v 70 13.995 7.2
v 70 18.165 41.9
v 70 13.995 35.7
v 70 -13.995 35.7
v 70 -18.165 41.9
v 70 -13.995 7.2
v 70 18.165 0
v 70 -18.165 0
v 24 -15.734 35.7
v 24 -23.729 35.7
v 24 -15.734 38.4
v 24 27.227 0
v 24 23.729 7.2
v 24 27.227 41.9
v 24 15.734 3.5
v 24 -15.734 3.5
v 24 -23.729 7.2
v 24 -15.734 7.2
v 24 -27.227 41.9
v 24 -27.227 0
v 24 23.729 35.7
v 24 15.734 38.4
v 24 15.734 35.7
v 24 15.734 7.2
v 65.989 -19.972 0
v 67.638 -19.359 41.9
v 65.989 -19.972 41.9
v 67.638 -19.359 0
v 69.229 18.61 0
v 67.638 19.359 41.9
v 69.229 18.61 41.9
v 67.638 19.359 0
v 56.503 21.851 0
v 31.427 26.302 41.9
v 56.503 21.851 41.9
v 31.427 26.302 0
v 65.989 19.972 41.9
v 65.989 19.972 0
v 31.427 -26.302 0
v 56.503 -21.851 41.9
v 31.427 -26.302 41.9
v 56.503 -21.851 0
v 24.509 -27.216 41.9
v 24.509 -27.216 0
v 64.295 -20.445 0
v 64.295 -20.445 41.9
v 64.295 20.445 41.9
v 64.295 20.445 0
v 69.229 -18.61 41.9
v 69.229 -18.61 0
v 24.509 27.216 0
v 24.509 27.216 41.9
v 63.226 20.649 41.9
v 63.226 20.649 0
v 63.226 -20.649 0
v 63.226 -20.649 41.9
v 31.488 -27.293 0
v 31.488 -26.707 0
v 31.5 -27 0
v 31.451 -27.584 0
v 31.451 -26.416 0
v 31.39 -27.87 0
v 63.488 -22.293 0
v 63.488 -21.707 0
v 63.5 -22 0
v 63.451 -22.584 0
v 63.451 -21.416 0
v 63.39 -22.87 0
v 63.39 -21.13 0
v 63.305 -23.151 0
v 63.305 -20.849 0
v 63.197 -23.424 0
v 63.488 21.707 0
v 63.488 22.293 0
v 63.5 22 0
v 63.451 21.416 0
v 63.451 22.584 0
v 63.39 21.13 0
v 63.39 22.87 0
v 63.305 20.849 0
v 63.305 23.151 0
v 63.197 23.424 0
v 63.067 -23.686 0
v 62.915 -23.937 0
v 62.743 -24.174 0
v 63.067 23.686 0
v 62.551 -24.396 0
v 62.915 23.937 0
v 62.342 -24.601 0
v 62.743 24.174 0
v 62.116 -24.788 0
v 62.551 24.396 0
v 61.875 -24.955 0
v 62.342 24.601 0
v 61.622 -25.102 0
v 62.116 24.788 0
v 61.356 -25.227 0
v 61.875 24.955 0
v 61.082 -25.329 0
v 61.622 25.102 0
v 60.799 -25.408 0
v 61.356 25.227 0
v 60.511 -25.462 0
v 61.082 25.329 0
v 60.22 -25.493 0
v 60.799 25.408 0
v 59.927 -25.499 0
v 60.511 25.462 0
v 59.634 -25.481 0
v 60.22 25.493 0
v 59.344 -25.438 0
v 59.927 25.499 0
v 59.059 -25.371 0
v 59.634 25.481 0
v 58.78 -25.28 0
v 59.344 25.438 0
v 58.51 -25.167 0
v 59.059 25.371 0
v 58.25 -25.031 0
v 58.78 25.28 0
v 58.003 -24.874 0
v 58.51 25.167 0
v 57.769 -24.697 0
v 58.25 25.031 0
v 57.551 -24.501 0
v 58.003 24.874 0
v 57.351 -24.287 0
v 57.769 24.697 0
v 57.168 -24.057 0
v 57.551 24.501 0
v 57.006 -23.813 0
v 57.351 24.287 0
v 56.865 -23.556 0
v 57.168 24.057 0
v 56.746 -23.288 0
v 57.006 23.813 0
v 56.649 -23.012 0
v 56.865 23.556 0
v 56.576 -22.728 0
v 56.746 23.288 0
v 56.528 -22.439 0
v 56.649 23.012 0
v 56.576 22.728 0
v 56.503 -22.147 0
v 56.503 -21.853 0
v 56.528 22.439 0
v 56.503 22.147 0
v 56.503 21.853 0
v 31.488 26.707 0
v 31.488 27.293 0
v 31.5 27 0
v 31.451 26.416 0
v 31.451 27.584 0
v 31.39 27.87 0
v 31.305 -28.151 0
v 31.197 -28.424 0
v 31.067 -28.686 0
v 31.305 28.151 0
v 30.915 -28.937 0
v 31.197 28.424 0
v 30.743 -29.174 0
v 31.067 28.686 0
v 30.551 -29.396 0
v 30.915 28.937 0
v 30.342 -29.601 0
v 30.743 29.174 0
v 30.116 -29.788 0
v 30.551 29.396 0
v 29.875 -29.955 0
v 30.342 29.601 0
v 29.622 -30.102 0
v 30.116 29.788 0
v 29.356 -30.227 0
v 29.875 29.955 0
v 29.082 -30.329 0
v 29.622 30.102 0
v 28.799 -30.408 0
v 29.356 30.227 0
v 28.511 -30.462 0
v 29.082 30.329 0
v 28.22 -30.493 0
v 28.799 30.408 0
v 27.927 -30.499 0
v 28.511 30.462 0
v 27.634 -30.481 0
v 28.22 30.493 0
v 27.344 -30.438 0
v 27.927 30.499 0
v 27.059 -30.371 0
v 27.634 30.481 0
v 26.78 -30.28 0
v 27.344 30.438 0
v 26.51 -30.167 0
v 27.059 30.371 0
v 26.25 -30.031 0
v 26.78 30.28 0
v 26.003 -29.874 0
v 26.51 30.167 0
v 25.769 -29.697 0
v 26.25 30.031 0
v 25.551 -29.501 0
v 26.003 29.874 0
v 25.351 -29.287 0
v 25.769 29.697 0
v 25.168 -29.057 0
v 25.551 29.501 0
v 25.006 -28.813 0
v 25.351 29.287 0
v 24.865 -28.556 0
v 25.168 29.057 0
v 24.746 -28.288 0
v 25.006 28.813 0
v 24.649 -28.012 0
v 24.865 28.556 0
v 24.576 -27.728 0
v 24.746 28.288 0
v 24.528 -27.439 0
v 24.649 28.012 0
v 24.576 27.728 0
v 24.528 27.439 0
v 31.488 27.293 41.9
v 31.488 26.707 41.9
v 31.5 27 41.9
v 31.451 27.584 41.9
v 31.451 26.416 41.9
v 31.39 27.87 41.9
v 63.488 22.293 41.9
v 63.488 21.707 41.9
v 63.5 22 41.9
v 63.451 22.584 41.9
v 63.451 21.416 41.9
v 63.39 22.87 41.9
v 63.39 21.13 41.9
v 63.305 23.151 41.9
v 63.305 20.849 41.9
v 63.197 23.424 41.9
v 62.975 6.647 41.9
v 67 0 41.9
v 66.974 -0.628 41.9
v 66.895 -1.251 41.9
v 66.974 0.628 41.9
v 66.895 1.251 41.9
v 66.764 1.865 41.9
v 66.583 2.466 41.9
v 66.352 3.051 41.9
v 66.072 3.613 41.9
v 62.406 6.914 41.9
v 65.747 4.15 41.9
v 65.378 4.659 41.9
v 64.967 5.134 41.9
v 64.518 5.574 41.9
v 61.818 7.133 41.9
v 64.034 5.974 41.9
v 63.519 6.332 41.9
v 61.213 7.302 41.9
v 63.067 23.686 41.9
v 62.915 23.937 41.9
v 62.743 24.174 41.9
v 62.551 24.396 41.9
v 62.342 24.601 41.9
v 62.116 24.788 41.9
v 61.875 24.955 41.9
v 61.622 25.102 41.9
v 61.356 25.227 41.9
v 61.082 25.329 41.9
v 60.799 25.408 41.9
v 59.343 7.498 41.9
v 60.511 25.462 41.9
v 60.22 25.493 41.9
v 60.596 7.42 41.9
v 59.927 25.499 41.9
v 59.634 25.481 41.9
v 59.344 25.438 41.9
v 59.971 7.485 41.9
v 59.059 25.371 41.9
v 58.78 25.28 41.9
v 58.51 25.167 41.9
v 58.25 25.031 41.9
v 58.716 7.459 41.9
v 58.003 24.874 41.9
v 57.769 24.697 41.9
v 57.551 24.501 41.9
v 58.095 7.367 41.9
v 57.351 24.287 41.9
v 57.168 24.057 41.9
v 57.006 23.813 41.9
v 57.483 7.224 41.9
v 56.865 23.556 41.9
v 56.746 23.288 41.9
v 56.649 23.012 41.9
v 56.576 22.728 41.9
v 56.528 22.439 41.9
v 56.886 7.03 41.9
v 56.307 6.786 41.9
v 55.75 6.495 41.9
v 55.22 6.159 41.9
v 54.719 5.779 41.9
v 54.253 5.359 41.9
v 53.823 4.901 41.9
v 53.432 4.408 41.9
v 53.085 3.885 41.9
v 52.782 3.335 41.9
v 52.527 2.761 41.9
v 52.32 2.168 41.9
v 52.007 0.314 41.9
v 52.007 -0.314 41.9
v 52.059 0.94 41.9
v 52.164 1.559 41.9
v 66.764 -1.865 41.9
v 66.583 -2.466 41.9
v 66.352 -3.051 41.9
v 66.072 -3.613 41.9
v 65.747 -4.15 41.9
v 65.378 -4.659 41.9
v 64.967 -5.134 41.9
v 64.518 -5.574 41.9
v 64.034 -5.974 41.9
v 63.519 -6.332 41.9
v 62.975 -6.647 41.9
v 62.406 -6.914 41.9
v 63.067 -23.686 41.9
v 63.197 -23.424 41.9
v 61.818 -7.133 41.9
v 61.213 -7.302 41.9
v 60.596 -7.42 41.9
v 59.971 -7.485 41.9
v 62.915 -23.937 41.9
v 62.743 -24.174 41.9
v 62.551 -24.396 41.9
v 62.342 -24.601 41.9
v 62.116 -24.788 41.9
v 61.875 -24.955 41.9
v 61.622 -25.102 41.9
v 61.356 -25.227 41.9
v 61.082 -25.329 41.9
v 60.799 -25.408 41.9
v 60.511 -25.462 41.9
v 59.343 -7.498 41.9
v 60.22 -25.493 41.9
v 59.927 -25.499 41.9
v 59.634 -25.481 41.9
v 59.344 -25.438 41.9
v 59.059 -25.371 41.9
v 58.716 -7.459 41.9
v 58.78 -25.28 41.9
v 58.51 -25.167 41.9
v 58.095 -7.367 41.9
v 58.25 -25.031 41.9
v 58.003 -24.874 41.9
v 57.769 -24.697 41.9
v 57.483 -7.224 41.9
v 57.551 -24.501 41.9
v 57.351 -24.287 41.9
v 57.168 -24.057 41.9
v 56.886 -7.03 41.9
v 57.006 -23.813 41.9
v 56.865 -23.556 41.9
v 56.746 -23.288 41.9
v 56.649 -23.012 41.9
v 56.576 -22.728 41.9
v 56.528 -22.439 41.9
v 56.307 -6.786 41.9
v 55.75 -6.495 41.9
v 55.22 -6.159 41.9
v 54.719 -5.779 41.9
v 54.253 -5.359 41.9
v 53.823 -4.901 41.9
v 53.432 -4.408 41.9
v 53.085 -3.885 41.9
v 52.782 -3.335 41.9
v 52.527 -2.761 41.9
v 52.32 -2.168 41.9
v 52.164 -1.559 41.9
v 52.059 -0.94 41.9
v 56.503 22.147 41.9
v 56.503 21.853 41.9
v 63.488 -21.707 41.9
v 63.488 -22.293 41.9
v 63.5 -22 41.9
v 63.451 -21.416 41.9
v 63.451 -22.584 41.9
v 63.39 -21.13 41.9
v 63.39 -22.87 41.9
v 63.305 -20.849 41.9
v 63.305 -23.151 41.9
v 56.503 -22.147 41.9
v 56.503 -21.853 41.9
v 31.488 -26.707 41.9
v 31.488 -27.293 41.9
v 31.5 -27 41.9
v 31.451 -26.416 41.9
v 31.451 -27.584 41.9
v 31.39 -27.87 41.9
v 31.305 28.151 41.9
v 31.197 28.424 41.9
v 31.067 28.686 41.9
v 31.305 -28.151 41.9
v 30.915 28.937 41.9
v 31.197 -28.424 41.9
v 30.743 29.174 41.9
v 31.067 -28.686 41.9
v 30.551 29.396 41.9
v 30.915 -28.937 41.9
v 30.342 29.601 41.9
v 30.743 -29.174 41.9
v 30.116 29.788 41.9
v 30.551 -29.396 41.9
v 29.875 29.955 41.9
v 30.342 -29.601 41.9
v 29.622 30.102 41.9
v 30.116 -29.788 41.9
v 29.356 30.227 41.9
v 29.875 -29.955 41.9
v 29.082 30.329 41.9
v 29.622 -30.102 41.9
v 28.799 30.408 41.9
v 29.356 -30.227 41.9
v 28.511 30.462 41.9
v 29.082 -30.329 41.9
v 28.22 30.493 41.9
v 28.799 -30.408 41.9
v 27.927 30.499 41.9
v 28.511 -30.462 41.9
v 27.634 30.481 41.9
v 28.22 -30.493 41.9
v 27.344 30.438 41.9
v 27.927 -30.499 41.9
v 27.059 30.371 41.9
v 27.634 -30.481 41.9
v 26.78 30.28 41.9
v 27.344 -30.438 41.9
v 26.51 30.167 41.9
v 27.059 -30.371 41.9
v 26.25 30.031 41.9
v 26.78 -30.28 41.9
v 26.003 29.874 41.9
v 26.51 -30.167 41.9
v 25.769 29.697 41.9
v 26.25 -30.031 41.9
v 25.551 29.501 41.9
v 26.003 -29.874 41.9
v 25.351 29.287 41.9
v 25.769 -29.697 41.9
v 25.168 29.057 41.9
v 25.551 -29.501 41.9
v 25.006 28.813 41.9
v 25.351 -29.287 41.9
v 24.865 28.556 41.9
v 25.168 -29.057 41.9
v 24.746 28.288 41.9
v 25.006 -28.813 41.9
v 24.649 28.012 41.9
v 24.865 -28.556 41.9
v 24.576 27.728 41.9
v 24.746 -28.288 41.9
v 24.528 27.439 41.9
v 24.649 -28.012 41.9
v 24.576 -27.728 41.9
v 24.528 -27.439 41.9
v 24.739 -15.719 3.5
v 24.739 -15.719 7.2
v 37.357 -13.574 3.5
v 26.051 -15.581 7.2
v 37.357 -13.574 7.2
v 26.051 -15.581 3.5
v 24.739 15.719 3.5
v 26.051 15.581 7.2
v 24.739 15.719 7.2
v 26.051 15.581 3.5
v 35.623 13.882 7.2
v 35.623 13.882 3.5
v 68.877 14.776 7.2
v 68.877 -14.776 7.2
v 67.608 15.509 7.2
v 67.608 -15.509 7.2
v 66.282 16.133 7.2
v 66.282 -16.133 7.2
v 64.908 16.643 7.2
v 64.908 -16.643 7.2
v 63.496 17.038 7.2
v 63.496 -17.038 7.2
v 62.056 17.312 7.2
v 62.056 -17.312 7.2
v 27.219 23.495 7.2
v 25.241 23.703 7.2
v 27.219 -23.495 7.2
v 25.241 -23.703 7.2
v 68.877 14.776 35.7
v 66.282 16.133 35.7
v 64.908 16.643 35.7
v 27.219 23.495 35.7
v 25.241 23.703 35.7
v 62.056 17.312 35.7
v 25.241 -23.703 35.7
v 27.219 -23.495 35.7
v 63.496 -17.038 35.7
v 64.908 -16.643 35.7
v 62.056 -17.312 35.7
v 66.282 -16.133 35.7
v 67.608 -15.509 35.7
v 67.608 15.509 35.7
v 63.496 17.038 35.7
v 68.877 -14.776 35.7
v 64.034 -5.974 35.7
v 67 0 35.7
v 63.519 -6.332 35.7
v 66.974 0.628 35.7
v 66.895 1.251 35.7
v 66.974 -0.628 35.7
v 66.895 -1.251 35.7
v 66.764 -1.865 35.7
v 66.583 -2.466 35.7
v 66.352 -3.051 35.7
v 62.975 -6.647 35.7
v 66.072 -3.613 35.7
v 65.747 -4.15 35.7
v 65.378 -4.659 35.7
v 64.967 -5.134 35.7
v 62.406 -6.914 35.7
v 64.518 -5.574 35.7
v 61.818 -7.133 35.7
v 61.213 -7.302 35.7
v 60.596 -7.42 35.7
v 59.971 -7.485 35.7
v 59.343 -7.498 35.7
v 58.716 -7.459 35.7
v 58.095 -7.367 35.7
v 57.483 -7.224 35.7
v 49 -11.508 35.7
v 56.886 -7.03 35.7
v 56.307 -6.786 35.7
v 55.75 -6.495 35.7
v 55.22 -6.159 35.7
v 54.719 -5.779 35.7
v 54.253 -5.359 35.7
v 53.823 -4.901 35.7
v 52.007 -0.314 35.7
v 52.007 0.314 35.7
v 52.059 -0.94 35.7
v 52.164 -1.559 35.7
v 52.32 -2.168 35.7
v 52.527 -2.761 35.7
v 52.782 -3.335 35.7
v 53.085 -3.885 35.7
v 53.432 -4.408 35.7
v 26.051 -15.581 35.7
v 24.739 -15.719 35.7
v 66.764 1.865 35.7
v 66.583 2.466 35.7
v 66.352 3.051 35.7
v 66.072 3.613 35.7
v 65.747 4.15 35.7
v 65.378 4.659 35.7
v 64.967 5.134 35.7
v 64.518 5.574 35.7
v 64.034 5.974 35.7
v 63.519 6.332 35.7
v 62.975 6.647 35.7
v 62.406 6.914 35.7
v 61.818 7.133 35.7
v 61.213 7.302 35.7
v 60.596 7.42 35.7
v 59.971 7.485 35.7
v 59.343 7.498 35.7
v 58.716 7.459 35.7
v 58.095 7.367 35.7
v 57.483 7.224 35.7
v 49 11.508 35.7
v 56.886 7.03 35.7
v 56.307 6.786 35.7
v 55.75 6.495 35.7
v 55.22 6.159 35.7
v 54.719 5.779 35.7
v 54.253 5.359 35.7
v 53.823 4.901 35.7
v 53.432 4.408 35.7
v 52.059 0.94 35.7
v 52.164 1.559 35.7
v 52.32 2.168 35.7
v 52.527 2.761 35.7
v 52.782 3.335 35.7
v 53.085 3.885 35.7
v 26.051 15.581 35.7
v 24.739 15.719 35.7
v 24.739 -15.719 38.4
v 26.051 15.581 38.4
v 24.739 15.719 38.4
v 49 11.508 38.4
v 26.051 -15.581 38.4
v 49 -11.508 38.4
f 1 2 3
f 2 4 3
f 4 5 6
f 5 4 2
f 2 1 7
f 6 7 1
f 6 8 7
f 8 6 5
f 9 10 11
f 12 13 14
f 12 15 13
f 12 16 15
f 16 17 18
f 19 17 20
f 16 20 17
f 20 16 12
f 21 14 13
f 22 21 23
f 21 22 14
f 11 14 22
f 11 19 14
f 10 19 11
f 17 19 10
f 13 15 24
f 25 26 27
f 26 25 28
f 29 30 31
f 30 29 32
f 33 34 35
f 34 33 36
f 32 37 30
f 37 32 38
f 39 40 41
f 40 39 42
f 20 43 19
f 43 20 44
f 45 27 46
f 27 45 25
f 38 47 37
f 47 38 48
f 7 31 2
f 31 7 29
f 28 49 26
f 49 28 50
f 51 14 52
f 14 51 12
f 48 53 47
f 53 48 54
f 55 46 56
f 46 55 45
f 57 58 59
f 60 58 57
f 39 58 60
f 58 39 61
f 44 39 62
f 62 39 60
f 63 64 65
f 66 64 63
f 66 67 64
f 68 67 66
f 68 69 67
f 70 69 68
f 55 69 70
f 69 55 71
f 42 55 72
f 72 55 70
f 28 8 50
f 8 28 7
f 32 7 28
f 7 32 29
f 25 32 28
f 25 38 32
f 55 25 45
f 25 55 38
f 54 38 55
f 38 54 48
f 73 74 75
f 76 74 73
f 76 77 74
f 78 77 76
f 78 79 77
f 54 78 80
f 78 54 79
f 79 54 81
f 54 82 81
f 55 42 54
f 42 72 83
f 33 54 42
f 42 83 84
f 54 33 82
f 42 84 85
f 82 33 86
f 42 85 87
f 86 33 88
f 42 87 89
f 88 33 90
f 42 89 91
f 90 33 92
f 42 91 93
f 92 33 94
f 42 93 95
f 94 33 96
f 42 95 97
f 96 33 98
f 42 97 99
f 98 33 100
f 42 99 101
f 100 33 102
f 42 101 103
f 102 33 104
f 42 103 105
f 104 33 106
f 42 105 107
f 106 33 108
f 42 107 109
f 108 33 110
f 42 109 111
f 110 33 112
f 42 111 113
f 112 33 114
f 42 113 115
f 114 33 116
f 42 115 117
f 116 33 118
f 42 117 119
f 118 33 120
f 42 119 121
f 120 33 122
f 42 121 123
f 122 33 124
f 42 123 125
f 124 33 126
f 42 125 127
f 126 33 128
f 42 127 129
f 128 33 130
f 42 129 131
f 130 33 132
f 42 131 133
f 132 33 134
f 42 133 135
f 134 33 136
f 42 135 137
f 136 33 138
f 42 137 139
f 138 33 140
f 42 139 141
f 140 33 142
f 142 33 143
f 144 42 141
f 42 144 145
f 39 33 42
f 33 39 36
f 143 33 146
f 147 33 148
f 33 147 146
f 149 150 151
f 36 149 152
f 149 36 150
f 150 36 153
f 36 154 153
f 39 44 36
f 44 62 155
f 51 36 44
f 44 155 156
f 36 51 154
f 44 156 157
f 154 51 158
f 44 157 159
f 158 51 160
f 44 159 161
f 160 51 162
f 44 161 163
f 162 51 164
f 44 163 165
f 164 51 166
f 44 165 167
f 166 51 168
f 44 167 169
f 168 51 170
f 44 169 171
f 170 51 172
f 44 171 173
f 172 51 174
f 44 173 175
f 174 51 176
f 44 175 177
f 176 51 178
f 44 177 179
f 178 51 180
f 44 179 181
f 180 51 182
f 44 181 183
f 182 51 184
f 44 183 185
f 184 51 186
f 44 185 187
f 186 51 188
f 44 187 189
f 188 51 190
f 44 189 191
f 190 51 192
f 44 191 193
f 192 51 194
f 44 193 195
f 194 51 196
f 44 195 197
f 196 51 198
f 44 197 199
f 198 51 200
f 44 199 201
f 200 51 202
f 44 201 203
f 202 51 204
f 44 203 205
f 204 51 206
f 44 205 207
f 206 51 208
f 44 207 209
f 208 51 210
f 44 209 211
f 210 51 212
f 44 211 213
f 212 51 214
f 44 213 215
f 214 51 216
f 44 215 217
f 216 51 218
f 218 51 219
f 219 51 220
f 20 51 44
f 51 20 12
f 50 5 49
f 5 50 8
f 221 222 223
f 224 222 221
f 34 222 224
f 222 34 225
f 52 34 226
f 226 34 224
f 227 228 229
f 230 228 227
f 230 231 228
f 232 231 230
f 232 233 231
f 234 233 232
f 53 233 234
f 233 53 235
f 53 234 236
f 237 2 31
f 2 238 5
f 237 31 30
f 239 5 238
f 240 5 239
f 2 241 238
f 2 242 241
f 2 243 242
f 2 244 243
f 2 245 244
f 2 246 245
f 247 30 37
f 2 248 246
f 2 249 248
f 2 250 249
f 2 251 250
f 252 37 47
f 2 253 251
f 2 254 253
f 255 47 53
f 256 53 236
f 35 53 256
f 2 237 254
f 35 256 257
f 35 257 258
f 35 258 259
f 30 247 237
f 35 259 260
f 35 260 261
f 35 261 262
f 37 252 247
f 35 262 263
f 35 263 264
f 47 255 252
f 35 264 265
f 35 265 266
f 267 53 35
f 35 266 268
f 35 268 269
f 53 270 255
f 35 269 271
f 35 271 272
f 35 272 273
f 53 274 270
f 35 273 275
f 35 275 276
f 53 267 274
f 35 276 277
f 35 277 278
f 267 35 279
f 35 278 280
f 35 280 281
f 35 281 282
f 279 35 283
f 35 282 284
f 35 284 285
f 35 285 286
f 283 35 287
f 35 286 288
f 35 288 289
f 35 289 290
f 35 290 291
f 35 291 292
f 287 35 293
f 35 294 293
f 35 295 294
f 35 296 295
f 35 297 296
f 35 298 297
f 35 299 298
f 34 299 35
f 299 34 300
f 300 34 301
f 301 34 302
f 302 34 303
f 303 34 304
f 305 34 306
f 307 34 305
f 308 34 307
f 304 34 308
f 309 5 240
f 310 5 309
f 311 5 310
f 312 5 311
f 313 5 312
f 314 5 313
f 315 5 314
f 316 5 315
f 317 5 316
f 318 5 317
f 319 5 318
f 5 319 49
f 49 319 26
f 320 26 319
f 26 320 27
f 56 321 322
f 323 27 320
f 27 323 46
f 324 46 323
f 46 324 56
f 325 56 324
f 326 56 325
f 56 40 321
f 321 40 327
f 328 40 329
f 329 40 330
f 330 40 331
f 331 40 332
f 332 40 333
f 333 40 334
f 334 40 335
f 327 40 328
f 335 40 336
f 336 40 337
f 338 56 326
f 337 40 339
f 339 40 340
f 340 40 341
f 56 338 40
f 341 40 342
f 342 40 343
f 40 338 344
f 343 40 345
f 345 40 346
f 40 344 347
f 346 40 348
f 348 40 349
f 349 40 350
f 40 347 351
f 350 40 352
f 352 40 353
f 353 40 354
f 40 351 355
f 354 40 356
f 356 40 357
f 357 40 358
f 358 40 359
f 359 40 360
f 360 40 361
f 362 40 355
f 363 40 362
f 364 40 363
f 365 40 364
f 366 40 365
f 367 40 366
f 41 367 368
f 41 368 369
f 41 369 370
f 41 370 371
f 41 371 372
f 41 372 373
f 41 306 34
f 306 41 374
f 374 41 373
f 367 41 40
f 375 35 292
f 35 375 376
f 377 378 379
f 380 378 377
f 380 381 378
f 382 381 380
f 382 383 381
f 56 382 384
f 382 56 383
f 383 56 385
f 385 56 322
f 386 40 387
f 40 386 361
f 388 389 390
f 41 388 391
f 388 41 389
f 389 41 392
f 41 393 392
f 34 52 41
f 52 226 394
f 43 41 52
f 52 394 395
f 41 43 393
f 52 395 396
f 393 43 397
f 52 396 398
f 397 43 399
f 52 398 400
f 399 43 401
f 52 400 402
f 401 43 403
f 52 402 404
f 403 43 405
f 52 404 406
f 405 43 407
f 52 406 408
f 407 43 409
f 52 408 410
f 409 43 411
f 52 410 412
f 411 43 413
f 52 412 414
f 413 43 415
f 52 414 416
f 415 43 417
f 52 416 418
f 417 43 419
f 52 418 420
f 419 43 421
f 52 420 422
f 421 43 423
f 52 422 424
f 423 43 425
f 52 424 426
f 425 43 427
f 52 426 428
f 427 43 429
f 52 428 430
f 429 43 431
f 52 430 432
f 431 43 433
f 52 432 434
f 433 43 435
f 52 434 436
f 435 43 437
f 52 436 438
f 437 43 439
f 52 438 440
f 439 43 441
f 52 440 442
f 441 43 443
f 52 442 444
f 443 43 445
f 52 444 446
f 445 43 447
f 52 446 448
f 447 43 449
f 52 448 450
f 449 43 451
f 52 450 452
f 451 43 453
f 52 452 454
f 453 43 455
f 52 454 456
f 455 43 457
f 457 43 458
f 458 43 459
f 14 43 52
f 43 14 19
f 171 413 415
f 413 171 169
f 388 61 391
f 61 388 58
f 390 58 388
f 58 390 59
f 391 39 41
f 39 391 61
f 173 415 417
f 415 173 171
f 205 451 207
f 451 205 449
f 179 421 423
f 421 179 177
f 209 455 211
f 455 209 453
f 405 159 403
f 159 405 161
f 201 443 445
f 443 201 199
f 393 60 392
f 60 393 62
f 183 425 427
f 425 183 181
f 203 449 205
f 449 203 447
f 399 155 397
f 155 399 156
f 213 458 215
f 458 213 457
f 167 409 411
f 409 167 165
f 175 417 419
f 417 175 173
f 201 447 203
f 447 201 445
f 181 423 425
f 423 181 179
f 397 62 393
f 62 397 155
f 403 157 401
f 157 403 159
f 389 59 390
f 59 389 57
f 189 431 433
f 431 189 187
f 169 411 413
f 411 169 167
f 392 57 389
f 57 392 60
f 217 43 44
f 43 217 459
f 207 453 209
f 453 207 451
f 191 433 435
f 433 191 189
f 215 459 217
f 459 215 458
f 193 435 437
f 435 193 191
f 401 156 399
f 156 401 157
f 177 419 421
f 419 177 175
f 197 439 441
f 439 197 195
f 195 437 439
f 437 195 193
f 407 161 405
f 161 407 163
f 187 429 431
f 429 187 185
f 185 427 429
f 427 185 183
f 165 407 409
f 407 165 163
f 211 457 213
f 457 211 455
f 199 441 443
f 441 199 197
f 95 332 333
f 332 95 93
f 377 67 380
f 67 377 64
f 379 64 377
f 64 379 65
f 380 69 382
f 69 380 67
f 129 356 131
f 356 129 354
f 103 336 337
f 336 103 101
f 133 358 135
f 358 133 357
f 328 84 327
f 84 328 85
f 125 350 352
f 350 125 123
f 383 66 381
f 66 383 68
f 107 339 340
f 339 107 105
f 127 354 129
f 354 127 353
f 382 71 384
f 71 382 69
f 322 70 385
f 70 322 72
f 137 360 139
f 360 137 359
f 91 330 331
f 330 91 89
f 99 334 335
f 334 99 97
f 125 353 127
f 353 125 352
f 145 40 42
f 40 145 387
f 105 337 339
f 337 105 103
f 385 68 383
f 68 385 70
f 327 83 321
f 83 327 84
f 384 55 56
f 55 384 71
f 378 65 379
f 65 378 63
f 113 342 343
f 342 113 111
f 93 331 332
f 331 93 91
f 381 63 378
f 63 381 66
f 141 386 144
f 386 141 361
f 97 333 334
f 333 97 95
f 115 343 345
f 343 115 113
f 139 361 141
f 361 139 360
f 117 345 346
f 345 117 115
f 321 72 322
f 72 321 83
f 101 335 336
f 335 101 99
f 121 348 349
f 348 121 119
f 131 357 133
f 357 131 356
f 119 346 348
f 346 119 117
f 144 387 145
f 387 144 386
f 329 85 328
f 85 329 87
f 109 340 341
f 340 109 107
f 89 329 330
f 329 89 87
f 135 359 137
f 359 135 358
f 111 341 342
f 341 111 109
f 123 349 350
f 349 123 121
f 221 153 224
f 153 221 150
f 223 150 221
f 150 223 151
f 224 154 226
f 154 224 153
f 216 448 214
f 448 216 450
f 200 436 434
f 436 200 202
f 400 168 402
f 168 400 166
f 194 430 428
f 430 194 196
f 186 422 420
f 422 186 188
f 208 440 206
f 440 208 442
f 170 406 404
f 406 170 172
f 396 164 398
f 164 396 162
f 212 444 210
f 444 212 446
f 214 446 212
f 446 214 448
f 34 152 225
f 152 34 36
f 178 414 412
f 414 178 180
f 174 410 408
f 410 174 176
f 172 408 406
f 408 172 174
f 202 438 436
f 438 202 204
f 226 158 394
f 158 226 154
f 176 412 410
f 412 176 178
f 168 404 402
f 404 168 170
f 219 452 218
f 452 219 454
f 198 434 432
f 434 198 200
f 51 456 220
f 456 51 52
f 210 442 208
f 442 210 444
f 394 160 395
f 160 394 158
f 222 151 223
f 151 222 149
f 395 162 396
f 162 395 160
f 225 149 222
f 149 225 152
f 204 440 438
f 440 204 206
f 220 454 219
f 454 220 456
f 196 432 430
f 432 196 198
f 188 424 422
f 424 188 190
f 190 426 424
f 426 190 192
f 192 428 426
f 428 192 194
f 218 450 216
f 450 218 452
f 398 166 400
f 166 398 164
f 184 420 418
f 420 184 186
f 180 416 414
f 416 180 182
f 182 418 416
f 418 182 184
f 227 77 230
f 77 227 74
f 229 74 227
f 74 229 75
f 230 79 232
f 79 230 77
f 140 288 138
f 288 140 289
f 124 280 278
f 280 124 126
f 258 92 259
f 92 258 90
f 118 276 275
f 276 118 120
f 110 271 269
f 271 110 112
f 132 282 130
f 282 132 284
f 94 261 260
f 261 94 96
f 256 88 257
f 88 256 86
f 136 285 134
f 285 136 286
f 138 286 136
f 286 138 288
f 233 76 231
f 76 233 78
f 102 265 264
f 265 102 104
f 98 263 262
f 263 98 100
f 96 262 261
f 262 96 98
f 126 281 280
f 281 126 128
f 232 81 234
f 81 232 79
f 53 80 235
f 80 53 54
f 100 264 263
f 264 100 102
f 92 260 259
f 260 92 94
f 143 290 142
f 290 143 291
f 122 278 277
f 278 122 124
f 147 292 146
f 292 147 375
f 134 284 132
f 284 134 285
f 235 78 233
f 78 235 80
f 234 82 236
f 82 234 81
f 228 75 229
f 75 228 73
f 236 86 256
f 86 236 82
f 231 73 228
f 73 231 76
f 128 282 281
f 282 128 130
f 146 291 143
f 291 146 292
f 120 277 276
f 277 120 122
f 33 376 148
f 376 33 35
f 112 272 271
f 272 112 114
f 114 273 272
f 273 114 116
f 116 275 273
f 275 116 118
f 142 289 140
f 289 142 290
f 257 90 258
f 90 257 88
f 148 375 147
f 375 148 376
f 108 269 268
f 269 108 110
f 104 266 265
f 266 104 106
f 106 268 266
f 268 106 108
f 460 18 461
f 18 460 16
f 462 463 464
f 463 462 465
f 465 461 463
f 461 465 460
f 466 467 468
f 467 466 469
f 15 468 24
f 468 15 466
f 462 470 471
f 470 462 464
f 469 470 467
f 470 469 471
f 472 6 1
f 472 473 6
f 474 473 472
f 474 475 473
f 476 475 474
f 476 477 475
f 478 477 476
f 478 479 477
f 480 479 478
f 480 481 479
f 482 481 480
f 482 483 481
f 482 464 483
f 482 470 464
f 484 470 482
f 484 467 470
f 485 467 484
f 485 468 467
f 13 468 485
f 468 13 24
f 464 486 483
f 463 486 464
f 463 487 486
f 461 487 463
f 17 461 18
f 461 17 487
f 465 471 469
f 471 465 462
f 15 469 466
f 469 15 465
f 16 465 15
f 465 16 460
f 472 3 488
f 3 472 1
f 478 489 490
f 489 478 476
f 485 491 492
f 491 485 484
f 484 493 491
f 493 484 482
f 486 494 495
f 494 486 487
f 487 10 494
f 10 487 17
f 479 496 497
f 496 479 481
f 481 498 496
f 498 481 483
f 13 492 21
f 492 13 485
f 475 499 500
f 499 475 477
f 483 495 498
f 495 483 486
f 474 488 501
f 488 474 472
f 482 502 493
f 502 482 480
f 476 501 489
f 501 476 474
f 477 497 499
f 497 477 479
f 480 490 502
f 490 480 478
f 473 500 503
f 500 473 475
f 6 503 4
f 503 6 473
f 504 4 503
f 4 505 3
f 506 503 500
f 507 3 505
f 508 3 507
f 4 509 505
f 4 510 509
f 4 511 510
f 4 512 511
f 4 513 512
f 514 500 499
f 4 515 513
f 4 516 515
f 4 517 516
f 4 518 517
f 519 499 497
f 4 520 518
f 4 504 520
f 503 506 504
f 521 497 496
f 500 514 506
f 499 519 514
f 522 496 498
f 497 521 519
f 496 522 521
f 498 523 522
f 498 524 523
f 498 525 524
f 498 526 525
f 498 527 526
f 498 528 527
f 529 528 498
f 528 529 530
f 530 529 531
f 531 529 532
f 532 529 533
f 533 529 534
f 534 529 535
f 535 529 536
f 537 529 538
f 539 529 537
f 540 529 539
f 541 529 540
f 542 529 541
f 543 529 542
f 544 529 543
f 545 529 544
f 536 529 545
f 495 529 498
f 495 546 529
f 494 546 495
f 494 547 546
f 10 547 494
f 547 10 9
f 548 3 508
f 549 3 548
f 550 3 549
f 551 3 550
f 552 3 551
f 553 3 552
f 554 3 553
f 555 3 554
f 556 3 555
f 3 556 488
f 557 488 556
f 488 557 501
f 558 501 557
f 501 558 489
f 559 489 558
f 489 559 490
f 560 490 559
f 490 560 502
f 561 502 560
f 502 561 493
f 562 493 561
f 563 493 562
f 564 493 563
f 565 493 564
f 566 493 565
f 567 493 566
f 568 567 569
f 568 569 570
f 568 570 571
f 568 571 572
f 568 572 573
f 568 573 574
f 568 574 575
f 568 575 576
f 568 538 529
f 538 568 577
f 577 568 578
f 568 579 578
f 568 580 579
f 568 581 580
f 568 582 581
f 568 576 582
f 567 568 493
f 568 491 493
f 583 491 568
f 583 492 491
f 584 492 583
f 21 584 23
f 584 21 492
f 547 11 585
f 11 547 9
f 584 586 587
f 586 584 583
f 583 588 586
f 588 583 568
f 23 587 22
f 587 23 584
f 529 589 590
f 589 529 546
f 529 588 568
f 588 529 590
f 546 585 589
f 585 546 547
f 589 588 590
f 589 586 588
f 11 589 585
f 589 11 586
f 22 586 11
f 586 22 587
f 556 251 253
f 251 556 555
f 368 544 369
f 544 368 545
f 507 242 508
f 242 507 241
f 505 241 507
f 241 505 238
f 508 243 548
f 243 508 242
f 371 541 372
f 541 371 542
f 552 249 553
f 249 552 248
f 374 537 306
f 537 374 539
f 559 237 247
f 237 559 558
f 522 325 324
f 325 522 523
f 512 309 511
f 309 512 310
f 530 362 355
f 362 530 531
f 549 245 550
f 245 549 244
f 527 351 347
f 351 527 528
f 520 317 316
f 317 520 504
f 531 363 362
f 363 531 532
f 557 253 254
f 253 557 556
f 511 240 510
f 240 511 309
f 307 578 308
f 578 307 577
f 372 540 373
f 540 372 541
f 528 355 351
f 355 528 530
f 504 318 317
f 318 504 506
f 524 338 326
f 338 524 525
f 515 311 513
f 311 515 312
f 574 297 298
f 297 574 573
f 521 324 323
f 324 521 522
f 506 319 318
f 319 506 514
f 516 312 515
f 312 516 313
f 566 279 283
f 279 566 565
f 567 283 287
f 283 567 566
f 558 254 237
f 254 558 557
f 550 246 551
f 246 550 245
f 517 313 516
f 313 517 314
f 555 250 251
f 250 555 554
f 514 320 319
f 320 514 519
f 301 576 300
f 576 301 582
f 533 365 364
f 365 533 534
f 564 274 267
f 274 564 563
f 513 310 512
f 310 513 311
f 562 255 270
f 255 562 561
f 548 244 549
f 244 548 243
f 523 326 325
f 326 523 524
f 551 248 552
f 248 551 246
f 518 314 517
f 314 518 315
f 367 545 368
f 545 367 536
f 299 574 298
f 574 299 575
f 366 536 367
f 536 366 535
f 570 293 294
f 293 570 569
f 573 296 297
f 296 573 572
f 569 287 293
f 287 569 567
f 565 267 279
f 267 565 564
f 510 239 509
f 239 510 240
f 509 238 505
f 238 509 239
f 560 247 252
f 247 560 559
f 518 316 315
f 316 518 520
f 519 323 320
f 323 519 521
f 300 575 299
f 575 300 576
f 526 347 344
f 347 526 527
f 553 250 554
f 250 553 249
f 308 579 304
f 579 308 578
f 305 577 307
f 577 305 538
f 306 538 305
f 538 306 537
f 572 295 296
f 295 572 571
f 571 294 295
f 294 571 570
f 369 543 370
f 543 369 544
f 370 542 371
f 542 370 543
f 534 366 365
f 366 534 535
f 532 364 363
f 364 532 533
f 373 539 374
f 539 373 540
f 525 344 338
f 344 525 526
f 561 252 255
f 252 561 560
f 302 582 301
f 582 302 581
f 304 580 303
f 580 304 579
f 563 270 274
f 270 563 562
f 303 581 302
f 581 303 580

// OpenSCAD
$fn = 75;

big_d = 47.5;
small_d = 35;

rant = 8;

width = 77;

top_rant_height = 2.7;
bottom_rant_height = 3.7;

body_height = 28.5;

cut_bottom_left = 35;
cut_bottom_right = 38;

cut_top_left = 49;
cut_top_right = 49;

cuffy_distance_near = 24;
cuffy_distance_far = 70;

cuffy_thick = 3.5;

cuffy_height = body_height +
                top_rant_height +
                bottom_rant_height +
                2 * cuffy_thick;

support_d = 7;

support1_position_width = 28;
support1_position_depth = -27;

support2_position_width = 60;
support2_position_depth = -22;

support3_position_width = 28;
support3_position_depth = 27;

support4_position_width = 60;
support4_position_depth = 22;

big_joint_d = 15;


module body() {
    translate([big_d/2, 0, 0])
    linear_extrude(height=body_height)
    hull() {
        circle(big_d/2, center=true);
        translate([width - big_d/2 - small_d/2, 0, 0])
        circle(small_d/2, center=true);
    };
};

module cuffy() {
    hang_width = cuffy_distance_far - cuffy_distance_near;
    hang_depth = big_d + 3* cuffy_thick;
    hang_height = bottom_rant_height +
                    body_height +
                    top_rant_height +
                    3 * cuffy_thick;
    intersection() {
        translate(
            [
                cuffy_distance_near,
                -hang_depth/2,
                -cuffy_thick/2
            ]
        )
        cube(
            [
                hang_width,
                hang_depth,
                hang_height
            ]
        );
        translate([big_d/2, 0, 0])
        linear_extrude(height=cuffy_height)
        hull() {
            circle(big_d/2 + cuffy_thick, center=true);
            translate([width - big_d/2 - small_d/2, 0, 0])
            circle(small_d/2 + cuffy_thick, center=true);
        };
    };
};

module bottom() {
    linear_extrude(height=bottom_rant_height)
    intersection() {
        polygon(
            [
                [0, big_d/2],
                [cut_bottom_left, big_d/2],
                [cut_bottom_right, -big_d/2],
                [0, -big_d/2],
            ]
        );
        translate([big_d/2, 0, 0])
        hull() {
            circle(big_d/2 - rant, center=true);
            translate([width - big_d/2 - small_d/2, 0, 0])
            circle(small_d/2 - rant, center=true);
        };
    };
};

module big_joint() {
    translate([0, 0, body_height/2])
    cylinder(r1=big_joint_d/2, r2=big_joint_d/2, h=body_height, center=true);
}


module top() {
    linear_extrude(height=top_rant_height)
    intersection() {
        polygon(
                [
                    [0, big_d/2],
                    [cut_top_left, big_d/2],
                    [cut_top_right, -big_d/2],
                    [0, -big_d/2],
                ]
        );
        translate([big_d/2, 0, 0])
        hull() {
            circle(big_d/2 - rant, center=true);
            translate([width - big_d/2 - small_d/2, 0, 0])
            circle(small_d/2 - rant, center=true);
        };
    };
};

module base() {
    union() {
        bottom();
        translate([0, 0, bottom_rant_height])
        body();
        translate([0, 0, bottom_rant_height + body_height])
        top();
    };
};

module support(pos_width, pos_depth) {
    translate([pos_width, pos_depth, cuffy_height/2])
    cylinder(r1=support_d/2, r2=support_d/2, h=cuffy_height, center=true);
}

difference() {
    union() {
        cuffy();
        support(support1_position_width, support1_position_depth);
        support(support2_position_width, support2_position_depth);
        support(support3_position_width, support3_position_depth);
        support(support4_position_width, support4_position_depth);
    };
    translate([0, 0, cuffy_thick])
    base();
    translate([width - small_d/2, 0, 2*body_height/3])
    big_joint();
};
